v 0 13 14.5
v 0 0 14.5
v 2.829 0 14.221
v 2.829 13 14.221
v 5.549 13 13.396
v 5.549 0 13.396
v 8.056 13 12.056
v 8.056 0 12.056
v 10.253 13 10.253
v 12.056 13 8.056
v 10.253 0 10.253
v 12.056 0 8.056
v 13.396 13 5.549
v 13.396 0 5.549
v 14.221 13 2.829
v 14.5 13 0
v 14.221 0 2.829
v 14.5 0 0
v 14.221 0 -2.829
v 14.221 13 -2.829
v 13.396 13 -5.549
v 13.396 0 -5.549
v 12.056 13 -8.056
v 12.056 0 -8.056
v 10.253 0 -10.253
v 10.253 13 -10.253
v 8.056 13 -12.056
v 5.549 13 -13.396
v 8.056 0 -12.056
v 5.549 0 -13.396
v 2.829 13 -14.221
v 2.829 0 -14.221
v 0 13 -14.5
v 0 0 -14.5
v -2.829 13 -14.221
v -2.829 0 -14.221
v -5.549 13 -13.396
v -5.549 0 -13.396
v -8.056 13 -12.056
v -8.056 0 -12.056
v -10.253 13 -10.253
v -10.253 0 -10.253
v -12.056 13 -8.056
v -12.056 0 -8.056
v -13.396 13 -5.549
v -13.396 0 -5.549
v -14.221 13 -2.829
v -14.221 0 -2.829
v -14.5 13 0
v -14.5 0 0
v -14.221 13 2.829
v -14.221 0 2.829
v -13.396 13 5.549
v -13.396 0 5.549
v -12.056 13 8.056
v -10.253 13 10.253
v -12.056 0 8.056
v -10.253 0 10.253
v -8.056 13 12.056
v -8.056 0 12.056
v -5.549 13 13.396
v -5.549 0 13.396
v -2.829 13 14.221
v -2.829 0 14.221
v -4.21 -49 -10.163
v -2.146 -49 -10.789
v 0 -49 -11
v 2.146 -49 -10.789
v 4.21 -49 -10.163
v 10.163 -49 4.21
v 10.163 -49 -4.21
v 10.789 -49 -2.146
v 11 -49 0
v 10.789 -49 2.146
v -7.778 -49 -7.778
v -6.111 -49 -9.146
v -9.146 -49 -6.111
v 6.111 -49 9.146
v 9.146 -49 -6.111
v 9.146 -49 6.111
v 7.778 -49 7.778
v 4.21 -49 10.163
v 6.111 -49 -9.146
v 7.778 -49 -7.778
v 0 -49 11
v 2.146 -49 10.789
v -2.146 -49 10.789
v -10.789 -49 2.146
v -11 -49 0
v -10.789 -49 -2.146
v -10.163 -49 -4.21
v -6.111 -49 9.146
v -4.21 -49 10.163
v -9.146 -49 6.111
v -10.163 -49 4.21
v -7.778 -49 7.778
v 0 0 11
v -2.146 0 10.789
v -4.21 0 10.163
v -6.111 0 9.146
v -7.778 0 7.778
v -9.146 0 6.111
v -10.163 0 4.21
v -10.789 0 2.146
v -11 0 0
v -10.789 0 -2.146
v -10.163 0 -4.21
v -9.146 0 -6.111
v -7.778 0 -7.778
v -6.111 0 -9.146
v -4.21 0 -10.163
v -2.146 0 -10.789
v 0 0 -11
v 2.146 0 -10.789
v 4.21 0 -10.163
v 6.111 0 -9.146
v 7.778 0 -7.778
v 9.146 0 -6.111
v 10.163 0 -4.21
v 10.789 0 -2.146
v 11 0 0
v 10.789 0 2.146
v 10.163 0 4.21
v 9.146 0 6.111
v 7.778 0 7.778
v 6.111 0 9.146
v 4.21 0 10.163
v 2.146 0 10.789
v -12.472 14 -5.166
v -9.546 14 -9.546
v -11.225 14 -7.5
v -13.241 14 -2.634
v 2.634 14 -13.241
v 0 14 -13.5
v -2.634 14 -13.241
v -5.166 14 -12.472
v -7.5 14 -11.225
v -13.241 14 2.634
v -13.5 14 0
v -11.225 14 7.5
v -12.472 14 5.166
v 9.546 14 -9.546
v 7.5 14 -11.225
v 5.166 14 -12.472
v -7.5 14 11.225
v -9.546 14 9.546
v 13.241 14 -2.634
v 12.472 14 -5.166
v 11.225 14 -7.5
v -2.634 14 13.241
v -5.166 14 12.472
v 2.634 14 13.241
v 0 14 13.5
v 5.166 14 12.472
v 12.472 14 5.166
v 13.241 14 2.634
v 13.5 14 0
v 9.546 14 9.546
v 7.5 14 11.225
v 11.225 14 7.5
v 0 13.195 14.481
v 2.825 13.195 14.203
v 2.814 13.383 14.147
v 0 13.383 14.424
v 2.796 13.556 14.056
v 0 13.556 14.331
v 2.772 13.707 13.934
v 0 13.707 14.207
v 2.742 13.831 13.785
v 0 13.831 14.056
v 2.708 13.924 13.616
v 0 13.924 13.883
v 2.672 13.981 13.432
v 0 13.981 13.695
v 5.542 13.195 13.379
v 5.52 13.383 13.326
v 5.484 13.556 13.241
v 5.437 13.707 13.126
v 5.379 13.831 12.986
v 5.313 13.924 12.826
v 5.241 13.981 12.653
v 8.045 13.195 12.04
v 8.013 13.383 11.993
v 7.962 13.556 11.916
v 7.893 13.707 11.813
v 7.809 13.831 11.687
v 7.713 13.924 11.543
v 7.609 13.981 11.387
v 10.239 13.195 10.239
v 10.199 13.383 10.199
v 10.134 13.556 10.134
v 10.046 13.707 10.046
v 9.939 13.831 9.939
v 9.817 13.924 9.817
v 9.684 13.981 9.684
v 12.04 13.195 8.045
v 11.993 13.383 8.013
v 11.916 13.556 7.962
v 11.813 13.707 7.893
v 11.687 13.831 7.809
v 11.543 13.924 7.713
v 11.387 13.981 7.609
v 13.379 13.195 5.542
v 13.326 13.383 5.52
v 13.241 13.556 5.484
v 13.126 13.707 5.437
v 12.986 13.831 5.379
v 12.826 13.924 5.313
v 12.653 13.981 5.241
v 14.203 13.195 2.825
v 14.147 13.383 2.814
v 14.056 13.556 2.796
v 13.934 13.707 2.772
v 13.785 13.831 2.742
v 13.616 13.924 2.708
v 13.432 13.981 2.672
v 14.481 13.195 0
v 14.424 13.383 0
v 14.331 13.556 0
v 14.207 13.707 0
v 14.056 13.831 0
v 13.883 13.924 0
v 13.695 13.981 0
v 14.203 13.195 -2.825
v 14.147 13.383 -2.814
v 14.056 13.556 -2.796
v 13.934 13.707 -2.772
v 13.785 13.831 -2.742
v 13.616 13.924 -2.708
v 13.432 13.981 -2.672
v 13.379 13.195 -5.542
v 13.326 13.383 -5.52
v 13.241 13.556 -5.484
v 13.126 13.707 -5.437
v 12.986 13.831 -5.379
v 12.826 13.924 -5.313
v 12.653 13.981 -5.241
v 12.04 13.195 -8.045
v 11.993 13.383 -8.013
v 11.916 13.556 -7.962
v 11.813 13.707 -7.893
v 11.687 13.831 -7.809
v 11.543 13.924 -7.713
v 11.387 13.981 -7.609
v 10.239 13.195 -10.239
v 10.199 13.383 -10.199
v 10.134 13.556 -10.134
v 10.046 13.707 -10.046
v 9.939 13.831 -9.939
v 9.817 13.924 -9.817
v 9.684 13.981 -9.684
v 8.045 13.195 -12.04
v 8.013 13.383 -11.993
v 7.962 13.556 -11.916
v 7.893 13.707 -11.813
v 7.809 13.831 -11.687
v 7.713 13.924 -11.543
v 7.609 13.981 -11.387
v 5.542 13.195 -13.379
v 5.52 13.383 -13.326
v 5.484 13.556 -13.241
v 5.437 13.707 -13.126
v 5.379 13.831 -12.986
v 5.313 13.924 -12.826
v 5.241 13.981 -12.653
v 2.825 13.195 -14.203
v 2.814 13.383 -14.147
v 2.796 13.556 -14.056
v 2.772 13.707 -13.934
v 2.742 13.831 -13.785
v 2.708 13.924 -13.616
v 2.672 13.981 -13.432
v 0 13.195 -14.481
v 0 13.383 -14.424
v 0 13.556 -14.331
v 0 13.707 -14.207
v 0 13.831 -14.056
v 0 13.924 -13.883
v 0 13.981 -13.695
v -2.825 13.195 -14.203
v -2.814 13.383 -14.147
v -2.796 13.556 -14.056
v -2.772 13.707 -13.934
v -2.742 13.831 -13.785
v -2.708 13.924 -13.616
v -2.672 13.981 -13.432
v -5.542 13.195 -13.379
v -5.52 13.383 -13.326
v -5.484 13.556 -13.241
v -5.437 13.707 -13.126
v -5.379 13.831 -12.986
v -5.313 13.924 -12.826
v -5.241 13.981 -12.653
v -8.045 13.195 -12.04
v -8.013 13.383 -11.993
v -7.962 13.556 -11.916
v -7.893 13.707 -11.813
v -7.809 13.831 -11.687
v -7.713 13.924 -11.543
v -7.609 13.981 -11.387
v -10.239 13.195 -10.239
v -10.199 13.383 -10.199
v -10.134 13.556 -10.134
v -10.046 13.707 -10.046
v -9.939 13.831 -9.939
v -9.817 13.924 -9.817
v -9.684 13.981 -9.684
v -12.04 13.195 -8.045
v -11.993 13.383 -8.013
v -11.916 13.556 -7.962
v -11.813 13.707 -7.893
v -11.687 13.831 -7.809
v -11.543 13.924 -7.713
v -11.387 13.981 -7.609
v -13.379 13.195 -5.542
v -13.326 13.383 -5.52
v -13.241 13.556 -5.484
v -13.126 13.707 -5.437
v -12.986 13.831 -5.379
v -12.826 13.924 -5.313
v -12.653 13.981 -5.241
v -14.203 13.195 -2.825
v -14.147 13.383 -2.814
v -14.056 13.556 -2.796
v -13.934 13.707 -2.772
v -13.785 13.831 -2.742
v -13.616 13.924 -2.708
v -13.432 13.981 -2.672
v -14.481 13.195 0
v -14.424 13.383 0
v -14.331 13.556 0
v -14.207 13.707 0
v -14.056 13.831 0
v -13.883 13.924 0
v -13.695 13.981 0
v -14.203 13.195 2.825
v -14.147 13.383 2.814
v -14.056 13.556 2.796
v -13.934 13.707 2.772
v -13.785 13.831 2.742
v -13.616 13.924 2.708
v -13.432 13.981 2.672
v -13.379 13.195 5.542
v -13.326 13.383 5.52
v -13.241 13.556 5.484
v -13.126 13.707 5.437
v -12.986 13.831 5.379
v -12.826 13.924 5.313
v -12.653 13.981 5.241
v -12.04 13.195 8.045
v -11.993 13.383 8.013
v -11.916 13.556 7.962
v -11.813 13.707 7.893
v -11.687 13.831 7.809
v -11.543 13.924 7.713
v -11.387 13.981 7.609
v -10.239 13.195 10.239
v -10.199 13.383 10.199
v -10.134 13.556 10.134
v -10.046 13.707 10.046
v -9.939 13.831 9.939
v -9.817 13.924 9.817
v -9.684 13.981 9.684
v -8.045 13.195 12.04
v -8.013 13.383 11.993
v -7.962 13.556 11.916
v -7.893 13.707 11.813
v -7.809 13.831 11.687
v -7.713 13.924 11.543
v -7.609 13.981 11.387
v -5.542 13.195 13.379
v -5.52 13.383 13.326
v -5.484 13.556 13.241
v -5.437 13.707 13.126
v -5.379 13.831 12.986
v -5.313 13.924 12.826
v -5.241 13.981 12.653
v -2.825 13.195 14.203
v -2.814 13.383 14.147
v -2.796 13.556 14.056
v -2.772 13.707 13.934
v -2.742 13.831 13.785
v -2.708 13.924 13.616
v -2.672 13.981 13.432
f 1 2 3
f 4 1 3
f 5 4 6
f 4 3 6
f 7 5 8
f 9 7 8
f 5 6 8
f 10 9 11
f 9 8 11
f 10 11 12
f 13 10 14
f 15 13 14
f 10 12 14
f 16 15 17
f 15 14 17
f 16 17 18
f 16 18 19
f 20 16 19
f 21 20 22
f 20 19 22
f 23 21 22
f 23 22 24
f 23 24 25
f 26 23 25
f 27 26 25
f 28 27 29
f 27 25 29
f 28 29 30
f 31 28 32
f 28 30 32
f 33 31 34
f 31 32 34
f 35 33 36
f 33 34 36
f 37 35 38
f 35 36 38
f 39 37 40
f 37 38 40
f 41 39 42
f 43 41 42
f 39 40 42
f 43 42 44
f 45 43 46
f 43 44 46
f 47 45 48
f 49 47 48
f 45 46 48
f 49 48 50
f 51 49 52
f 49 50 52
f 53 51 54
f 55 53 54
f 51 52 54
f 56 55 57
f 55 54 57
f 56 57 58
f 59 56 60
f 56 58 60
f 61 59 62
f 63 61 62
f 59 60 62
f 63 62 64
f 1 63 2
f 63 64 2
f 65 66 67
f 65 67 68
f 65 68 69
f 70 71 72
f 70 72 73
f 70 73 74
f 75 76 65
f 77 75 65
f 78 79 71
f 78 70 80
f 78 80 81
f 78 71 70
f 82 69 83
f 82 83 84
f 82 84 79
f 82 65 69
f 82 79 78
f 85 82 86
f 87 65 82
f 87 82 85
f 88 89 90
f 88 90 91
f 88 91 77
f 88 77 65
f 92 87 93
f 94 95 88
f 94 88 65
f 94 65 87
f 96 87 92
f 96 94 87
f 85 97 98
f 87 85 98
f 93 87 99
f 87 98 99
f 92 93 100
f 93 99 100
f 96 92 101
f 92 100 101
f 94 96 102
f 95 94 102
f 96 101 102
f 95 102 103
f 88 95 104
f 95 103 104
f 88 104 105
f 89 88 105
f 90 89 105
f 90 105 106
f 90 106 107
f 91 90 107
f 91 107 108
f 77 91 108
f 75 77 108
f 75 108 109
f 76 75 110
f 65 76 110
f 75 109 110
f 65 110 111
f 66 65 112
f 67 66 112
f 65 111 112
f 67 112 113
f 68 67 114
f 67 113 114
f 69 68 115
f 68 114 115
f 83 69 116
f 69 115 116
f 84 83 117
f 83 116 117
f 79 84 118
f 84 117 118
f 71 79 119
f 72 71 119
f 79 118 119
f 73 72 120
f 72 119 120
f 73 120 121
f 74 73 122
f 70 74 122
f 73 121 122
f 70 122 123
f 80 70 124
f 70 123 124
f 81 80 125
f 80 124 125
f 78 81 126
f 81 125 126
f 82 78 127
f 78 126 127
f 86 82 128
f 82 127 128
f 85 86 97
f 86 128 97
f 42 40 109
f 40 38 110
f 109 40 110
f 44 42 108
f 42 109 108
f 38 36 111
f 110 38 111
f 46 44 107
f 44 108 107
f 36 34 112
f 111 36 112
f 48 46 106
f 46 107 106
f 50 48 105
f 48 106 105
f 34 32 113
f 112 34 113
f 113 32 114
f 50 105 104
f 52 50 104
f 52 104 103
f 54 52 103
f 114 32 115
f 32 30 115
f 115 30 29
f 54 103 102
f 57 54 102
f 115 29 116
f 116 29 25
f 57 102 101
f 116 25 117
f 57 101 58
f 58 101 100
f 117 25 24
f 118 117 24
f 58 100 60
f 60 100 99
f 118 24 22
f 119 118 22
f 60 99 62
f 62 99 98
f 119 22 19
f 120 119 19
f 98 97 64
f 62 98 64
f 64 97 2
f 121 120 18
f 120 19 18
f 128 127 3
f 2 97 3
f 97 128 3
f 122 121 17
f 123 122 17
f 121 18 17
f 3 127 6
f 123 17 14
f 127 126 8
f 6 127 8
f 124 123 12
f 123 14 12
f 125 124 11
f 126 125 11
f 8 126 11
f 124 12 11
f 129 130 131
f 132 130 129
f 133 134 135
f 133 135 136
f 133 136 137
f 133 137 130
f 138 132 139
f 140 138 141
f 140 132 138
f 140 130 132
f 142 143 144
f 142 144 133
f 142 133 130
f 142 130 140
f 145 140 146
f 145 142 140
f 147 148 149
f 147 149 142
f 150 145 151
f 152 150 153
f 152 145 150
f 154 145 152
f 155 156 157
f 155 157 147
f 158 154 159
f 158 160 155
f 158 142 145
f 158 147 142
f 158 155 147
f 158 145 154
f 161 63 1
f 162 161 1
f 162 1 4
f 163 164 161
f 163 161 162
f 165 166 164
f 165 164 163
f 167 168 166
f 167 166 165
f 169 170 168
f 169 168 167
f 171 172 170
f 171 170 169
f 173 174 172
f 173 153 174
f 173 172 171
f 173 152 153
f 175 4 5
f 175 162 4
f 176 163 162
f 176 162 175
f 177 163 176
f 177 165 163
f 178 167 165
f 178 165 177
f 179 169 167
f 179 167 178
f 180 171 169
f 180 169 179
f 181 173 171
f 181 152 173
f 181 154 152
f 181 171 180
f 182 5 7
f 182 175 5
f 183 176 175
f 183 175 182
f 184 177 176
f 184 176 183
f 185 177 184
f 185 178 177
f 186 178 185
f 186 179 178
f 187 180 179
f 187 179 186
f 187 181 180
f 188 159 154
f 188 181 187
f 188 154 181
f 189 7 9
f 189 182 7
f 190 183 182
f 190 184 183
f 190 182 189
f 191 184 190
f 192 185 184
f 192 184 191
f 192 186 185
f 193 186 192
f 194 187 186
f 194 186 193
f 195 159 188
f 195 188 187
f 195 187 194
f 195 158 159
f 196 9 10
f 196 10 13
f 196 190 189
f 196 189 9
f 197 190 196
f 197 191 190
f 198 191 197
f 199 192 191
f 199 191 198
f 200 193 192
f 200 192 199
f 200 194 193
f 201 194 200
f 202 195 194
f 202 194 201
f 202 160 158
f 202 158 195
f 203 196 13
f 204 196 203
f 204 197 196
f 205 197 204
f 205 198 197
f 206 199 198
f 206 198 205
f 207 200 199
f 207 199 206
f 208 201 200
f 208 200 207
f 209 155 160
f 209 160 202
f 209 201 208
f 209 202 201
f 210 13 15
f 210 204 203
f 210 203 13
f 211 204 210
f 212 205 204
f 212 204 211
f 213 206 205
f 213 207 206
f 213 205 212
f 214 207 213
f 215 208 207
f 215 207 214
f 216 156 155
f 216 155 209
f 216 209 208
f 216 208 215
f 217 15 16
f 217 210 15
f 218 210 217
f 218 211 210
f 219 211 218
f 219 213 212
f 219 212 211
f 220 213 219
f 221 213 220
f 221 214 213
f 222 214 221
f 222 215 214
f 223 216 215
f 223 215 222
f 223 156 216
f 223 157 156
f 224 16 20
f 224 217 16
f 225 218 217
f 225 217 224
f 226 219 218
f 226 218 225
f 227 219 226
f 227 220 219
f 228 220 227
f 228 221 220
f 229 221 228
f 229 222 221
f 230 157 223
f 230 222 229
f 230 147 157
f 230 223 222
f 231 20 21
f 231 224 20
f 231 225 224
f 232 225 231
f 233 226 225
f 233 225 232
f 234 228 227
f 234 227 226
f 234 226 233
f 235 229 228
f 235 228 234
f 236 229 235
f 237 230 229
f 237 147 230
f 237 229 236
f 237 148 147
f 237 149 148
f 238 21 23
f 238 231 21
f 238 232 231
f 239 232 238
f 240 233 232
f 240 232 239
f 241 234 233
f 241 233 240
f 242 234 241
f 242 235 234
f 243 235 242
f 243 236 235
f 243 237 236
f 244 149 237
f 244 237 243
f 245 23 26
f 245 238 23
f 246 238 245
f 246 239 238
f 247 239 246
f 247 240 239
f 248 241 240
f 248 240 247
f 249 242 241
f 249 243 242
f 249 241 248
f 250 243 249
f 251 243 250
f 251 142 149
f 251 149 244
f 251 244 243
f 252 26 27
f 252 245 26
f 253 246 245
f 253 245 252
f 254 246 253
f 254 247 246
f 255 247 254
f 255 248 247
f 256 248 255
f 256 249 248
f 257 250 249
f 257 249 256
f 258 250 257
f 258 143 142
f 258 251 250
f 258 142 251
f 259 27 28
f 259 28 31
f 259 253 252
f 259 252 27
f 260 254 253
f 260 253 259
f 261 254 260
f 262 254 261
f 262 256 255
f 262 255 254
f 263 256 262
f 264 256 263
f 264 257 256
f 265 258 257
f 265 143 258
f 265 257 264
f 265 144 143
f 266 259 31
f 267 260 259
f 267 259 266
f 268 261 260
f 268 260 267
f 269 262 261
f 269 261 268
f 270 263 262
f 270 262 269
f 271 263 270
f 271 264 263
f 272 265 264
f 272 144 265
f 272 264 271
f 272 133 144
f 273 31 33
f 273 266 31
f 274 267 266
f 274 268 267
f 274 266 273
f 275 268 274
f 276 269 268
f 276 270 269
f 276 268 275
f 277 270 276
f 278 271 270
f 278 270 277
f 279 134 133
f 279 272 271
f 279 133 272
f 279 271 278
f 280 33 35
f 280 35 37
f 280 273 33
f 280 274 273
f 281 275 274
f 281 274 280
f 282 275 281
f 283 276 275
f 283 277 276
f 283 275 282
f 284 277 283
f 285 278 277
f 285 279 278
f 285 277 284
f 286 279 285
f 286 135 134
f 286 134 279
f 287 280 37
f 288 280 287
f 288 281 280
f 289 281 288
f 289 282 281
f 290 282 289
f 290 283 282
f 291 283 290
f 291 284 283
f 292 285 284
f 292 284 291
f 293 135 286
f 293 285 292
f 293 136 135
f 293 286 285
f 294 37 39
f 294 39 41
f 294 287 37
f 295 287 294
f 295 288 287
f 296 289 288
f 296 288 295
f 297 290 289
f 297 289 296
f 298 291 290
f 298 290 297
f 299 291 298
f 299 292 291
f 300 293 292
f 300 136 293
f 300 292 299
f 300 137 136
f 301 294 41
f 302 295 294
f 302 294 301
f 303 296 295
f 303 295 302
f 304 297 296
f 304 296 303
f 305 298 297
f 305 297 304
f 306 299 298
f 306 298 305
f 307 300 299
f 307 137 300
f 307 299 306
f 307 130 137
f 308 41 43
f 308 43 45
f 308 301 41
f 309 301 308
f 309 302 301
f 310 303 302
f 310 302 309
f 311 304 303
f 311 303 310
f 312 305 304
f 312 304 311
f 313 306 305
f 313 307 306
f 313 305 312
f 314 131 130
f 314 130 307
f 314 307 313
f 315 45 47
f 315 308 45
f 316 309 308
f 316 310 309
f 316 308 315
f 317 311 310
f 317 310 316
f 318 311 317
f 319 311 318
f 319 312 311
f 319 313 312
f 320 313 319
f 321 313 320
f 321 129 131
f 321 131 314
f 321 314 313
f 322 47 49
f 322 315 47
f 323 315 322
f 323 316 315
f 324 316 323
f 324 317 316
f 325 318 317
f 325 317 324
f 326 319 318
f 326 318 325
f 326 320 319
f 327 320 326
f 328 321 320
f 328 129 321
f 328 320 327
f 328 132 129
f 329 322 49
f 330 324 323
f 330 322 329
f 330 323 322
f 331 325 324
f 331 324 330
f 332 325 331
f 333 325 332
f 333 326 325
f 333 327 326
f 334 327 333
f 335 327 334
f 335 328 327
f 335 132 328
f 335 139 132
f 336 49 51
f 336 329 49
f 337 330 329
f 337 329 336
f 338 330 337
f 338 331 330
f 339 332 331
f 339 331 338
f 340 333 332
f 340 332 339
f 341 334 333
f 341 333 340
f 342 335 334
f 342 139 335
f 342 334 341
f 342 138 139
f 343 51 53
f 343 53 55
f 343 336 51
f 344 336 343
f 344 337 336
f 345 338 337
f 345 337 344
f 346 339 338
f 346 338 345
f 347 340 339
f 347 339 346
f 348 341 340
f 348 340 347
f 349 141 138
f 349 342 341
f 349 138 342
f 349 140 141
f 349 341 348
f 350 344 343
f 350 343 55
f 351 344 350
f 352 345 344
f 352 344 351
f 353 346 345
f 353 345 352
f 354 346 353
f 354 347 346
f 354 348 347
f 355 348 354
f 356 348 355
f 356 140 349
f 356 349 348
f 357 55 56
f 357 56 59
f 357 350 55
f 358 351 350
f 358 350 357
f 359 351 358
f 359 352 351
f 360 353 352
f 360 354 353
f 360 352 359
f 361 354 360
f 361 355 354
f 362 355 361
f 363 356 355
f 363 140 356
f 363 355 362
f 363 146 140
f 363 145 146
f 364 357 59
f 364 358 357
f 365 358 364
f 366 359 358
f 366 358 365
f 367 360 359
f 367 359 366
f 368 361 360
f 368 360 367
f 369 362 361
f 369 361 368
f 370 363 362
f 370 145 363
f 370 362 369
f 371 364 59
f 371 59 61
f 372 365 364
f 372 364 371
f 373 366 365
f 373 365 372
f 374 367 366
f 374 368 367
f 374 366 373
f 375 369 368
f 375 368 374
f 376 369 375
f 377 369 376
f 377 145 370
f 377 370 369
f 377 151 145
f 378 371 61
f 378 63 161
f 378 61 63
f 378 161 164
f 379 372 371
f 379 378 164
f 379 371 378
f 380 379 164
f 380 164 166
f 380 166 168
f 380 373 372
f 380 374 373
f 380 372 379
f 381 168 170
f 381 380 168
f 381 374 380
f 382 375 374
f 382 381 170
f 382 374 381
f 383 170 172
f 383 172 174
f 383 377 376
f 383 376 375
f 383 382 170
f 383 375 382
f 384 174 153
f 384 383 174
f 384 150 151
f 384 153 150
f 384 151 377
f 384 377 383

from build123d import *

# Parameters (mm, degrees)
SKETCH_2_R      = 14.5
EXTRUDE_1_DEPTH = 14
SKETCH_3_R      = 11
EXTRUDE_2_DEPTH = 49
FILLET_1_R      = 1


with BuildPart() as part:
    # 草图2 → 凸台-拉伸1 (new body)
    with BuildSketch(Plane(origin=(0, 0, 0), x_dir=(1, 0, 0), z_dir=(0, 1, 0))):
        with Locations(Location((0, 0, 0), (0, 0, 270))):
            Circle(SKETCH_2_R)
    extrude(amount=EXTRUDE_1_DEPTH)

    # 草图3 → 凸台-拉伸2 (add)
    with BuildSketch(Plane.XZ):
        with Locations(Location((0, 0, 0), (0, 0, 90))):
            Circle(SKETCH_3_R)
    extrude(amount=EXTRUDE_2_DEPTH)

    # 圆角1
    fillet_1_edges = [part.edges().sort_by_distance(p)[0] for p in [
        (0, 14, -14.5),
    ]]
    fillet(fillet_1_edges, radius=FILLET_1_R)


solid = part.part
